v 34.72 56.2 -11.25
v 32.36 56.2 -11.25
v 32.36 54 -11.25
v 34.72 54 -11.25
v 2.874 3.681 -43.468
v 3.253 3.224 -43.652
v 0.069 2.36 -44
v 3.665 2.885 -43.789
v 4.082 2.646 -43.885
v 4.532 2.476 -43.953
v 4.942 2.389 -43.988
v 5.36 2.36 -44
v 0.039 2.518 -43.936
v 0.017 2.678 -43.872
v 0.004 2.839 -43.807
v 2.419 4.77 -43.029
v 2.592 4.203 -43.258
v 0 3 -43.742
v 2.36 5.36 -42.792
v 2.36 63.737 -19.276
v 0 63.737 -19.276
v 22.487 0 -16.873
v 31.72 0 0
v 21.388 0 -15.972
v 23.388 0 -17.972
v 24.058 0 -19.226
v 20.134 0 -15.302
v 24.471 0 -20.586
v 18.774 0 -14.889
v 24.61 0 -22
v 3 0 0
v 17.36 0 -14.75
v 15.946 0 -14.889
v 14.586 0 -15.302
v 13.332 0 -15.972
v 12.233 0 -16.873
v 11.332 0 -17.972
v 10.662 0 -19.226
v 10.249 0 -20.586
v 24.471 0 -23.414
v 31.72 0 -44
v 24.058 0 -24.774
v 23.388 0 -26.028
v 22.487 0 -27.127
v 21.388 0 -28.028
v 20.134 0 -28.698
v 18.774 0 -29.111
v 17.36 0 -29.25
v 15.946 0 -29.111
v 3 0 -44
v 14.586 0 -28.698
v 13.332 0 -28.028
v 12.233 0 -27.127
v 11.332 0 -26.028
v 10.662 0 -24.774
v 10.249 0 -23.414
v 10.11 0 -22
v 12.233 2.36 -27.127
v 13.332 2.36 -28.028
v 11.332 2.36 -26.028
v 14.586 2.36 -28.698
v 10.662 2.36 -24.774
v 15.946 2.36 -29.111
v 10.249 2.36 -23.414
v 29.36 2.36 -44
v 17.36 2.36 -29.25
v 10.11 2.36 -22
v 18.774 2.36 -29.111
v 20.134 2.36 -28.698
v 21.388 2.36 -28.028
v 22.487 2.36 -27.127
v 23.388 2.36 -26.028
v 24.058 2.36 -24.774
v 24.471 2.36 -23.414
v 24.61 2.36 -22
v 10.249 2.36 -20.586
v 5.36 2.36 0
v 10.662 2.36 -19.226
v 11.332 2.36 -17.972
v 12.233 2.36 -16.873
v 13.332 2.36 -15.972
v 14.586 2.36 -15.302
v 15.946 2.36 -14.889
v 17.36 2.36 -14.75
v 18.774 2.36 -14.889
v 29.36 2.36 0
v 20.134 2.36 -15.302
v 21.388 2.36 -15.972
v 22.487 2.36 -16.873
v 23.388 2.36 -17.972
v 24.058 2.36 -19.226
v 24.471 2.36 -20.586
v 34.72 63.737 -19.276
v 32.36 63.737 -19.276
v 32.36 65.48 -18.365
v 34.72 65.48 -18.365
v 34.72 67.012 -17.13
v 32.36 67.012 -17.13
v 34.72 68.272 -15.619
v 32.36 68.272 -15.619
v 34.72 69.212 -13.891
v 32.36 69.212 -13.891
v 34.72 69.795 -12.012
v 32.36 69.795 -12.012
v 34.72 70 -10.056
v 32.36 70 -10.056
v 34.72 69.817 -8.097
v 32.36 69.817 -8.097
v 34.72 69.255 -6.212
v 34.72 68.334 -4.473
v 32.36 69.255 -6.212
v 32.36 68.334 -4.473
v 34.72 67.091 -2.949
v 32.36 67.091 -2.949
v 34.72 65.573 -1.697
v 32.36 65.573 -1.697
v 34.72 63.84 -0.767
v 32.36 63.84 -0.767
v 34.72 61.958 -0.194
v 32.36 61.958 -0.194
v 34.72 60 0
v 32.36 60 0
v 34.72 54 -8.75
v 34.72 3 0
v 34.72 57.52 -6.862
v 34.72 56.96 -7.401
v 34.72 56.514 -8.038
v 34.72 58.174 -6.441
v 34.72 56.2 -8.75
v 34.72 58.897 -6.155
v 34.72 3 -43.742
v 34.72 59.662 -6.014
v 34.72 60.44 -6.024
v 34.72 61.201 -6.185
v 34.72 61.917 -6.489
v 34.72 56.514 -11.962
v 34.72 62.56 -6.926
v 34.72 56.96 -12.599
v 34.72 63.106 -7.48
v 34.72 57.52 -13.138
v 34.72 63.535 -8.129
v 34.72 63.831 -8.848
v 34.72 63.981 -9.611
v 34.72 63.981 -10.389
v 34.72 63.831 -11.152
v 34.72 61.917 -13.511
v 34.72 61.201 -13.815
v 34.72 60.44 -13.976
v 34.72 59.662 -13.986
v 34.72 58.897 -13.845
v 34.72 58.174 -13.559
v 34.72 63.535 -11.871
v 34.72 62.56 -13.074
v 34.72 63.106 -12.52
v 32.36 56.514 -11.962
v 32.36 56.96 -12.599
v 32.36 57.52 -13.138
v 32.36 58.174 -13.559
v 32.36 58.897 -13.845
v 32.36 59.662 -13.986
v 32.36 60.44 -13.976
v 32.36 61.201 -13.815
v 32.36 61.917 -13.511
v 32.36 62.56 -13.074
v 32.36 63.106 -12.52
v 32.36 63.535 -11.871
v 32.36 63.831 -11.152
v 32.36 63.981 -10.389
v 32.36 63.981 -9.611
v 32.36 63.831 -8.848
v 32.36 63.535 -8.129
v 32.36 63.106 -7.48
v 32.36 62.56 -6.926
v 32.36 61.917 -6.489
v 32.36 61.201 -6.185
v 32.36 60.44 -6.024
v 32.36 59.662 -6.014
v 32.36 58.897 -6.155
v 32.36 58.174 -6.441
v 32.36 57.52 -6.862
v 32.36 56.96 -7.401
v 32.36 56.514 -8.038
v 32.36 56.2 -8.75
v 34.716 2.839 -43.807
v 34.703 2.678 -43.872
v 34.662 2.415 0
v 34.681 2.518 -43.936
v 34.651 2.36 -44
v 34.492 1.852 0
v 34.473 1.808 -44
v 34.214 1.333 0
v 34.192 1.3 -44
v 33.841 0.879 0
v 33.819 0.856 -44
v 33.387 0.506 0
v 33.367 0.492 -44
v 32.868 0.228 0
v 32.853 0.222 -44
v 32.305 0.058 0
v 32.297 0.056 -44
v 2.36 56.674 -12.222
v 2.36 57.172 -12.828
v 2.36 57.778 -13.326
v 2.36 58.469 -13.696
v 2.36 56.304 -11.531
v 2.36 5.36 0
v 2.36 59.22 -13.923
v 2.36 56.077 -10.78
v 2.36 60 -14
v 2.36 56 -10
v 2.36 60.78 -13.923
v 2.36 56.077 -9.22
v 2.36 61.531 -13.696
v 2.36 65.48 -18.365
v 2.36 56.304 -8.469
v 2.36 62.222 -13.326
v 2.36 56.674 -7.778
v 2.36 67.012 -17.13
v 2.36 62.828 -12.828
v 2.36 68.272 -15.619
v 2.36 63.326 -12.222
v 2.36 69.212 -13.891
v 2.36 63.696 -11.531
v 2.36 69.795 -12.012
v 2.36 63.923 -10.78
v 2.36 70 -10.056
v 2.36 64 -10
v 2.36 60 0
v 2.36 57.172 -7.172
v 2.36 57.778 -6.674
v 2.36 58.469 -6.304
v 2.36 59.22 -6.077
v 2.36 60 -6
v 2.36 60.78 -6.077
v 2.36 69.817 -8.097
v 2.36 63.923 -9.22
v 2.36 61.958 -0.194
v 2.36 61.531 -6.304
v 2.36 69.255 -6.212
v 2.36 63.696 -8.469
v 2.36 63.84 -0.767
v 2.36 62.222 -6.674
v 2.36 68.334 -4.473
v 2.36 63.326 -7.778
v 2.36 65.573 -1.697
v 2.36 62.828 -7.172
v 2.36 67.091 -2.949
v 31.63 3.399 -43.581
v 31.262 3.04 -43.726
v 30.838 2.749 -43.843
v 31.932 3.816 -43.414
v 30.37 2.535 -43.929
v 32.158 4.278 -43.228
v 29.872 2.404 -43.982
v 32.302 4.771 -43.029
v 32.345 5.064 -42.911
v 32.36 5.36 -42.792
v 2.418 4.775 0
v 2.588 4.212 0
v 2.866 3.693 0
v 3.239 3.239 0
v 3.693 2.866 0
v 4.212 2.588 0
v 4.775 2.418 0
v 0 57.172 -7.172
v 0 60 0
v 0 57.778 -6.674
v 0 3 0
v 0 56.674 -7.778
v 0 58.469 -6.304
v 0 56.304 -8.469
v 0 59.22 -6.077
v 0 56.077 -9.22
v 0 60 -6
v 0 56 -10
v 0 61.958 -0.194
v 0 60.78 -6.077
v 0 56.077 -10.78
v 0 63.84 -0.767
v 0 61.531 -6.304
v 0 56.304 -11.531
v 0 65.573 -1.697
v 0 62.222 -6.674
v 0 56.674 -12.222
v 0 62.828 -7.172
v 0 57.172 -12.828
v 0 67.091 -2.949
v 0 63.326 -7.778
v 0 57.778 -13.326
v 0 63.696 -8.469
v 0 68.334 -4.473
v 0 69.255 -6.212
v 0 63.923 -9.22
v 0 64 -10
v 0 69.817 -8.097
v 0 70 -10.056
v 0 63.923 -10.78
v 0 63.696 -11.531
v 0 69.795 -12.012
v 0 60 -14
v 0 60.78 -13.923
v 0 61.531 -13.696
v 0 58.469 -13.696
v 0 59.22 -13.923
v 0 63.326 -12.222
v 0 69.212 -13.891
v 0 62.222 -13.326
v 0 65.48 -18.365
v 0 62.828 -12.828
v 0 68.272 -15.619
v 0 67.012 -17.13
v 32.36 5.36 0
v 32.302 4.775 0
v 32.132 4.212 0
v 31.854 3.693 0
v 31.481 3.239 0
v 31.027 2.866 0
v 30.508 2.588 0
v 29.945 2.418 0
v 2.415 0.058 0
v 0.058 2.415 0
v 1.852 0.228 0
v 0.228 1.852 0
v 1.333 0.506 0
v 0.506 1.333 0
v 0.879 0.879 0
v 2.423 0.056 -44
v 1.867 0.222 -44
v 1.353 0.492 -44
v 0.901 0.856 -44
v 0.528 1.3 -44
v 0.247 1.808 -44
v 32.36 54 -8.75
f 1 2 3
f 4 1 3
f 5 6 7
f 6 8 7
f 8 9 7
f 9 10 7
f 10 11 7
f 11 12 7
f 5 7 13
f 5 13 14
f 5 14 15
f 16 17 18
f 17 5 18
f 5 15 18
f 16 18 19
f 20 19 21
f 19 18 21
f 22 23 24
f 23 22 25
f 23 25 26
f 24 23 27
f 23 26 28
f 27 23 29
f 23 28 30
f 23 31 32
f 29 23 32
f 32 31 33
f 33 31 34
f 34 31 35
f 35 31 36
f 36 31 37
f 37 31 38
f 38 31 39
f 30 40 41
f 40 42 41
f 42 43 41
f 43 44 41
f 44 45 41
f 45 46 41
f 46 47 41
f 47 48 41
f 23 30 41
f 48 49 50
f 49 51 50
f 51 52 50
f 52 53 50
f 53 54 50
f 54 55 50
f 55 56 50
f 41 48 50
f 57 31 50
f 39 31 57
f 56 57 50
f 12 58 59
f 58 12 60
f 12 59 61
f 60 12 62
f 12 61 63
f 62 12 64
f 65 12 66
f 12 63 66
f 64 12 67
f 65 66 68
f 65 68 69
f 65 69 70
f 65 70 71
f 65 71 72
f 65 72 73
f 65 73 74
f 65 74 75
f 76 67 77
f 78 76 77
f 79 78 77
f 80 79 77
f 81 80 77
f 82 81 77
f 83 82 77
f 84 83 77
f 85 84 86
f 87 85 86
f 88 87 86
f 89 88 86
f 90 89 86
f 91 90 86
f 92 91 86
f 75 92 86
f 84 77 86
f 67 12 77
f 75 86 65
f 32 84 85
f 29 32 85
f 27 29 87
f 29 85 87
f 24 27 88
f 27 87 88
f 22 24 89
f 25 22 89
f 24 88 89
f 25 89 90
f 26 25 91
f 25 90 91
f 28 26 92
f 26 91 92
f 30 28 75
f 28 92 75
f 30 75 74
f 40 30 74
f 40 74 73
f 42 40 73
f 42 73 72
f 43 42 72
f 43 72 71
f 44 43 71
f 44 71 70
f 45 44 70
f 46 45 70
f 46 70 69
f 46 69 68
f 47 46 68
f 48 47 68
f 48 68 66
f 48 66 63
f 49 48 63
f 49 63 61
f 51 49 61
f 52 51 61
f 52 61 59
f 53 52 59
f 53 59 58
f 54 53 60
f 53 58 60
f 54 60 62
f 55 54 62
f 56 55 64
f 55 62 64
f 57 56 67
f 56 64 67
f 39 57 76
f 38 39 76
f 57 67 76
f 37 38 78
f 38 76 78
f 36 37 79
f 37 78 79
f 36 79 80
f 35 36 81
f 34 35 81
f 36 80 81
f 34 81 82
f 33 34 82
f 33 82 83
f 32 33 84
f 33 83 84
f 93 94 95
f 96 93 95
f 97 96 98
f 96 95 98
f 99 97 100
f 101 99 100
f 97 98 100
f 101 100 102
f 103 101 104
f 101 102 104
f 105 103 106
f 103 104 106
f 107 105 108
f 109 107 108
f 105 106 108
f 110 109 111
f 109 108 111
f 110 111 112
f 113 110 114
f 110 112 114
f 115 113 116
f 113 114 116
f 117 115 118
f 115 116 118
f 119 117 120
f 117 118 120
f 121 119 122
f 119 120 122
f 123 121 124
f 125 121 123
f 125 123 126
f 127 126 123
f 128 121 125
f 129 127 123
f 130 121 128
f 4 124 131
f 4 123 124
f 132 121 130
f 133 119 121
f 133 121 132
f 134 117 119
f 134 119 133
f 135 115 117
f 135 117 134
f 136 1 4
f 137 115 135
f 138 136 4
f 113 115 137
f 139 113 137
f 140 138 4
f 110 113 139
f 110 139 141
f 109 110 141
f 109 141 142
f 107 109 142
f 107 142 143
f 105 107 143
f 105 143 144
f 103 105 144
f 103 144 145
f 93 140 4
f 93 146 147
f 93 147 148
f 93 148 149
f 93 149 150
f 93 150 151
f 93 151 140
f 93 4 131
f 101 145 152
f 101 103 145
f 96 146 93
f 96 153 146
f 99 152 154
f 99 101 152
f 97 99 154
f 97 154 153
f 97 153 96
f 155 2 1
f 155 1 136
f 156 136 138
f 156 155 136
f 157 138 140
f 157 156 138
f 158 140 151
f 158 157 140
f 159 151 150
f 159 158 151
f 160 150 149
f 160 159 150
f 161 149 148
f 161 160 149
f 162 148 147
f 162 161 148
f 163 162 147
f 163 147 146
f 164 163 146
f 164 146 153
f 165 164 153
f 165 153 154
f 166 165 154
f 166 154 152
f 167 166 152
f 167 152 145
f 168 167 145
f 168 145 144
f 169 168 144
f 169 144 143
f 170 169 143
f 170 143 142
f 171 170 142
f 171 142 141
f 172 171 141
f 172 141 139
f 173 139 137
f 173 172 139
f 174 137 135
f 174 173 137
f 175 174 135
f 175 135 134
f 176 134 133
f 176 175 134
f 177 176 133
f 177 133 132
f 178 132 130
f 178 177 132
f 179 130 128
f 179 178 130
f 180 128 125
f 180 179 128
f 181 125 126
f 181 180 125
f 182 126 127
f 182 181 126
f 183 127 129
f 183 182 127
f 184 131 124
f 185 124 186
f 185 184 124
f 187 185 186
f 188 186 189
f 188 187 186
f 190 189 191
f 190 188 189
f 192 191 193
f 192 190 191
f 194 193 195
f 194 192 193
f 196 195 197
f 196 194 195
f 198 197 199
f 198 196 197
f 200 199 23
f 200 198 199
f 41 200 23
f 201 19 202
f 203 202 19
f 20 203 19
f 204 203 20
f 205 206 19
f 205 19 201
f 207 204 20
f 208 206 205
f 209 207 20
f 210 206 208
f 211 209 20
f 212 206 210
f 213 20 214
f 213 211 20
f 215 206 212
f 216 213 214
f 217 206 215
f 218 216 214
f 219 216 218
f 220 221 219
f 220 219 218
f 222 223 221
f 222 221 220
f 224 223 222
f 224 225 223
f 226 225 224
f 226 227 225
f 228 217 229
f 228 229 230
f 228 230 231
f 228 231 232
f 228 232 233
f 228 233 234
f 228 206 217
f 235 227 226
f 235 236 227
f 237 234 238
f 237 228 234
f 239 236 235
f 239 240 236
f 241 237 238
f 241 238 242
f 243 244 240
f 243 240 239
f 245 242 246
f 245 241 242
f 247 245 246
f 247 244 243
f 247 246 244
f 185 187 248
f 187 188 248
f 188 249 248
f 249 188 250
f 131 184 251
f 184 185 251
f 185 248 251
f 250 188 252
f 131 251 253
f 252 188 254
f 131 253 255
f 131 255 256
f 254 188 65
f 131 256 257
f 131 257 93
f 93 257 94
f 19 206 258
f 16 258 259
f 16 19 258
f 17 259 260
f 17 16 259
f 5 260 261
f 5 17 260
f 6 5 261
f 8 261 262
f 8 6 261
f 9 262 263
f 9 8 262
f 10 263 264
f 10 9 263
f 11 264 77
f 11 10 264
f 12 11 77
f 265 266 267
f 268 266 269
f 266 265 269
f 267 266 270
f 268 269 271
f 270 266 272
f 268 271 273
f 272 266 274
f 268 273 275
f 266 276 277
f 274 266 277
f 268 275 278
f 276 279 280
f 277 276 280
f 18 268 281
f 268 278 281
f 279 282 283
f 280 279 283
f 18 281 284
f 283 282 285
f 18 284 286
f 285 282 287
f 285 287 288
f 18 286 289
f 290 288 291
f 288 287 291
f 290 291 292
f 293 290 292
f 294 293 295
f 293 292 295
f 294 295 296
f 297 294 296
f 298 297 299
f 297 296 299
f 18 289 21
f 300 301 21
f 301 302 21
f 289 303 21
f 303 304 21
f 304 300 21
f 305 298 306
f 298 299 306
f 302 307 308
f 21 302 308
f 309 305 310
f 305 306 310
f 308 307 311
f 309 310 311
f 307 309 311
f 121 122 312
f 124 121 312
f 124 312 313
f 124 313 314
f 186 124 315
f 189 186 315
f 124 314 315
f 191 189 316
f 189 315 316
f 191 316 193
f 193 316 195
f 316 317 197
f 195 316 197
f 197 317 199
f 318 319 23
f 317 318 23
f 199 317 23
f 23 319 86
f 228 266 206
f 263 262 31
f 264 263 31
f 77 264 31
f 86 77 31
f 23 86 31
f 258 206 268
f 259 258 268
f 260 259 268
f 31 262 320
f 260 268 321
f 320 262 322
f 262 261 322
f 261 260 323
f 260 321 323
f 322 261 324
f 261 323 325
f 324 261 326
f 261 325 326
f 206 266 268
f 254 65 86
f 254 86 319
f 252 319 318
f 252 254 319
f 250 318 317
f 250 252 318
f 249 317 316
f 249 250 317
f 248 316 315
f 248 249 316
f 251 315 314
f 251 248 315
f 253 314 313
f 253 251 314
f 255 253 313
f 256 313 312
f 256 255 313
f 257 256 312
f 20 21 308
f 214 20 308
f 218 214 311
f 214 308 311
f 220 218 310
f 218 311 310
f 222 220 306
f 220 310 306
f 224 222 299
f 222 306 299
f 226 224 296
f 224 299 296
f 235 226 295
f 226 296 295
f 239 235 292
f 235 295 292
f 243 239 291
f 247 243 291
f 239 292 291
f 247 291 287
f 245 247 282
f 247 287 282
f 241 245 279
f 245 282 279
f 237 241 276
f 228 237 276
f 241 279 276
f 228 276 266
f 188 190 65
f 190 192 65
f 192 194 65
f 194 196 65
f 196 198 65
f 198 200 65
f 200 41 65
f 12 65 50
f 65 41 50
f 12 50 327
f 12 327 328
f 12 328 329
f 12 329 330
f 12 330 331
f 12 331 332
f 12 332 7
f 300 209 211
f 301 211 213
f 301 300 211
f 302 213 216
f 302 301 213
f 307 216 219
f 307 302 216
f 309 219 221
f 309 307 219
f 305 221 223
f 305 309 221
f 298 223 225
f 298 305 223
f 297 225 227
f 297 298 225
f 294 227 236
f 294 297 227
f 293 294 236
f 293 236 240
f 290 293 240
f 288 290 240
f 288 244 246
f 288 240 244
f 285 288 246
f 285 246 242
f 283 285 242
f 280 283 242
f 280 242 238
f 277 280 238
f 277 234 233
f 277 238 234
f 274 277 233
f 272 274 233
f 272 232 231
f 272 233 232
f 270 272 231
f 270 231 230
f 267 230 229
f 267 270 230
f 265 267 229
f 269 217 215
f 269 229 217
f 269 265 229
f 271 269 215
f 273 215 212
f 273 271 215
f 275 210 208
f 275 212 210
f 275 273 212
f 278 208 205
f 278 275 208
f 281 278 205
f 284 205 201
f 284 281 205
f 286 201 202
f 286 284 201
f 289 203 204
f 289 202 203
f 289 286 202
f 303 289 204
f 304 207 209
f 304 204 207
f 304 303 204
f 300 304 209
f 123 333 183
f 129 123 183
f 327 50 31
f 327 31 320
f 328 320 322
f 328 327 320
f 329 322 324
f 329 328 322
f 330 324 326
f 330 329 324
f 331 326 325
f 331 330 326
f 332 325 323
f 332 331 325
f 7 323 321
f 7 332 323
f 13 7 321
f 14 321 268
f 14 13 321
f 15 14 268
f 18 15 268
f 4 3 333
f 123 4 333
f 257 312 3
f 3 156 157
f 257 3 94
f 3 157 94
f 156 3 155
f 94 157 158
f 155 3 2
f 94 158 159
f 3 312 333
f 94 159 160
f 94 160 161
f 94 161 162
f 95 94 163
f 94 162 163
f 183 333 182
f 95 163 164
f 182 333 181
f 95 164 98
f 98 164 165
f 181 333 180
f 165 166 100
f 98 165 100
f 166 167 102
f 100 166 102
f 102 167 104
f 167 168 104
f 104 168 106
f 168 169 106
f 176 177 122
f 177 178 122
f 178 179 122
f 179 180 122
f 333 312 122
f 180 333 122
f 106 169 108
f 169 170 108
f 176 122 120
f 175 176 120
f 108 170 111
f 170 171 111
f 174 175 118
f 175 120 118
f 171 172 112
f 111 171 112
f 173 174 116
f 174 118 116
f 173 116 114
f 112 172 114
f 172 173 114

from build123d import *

# Parameters (mm, degrees)
CROQUIS1_R              = 4
SALIENTE_EXTRUIR1_DEPTH = 34.72
CROQUIS2_W              = 30
CROQUIS2_H              = 67.64
CORTAR_EXTRUIR1_DEPTH   = 90.67429063
REDONDEO1_R             = 3
CORTAR_EXTRUIR2_DEPTH   = 89.787215296
CROQUIS4_R              = 7.25
CORTAR_EXTRUIR3_DEPTH   = 88.844453439


with BuildPart() as part:
    # Croquis1 → Saliente-Extruir1 (new body)
    with BuildSketch(Plane(origin=(0, 0, 0), x_dir=(0, 0, -1), z_dir=(1, 0, 0))):
        with BuildLine():
            Line((0, 60), (0, 0))
            Line((0, 0), (44, 0))
            Line((44, 0), (44, 2.36))
            Line((44, 2.36), (19.275687183, 63.736526097))
            ThreePointArc((19.275687183, 63.736526097), (8.096959254, 69.817251953), (0, 60))
        make_face()
        with Locations((10, 60)):
            Circle(CROQUIS1_R, mode=Mode.SUBTRACT)
    extrude(amount=SALIENTE_EXTRUIR1_DEPTH)

    # Croquis2 → Cortar-Extruir1 (cut, through all)
    with BuildSketch(Plane.XY):
        with Locations((17.36, 36.18)):
            Rectangle(CROQUIS2_W, CROQUIS2_H)
    extrude(amount=-CORTAR_EXTRUIR1_DEPTH, mode=Mode.SUBTRACT)

    # Redondeo1
    redondeo1_edges = [part.edges().sort_by_distance(p)[0] for p in [
        (34.72, 0, -22),
        (0, 0, -22),
        (32.36, 2.36, -22),
        (2.36, 2.36, -22),
    ]]
    fillet(redondeo1_edges, radius=REDONDEO1_R)

    # Croquis3 → Cortar-Extruir2 (cut, through all)
    with BuildSketch(Plane.ZY.offset(-32.36)):
        with BuildLine():
            Line((-8.75, 54), (-8.75, 56.200328962))
            ThreePointArc((-8.75, 56.200328962), (-10, 56), (-11.25, 56.200328962))
            Line((-11.25, 56.200328962), (-11.25, 54))
            Line((-11.25, 54), (-8.75, 54))
        make_face()
    extrude(amount=-CORTAR_EXTRUIR2_DEPTH, mode=Mode.SUBTRACT)

    # Croquis4 → Cortar-Extruir3 (cut, through all)
    with BuildSketch(Plane(origin=(0, 2.36, 0), x_dir=(1, 0, 0), z_dir=(0, 1, 0))):
        with Locations(Location((17.36, 22, 0), (0, 0, 270))):
            Circle(CROQUIS4_R)
    extrude(amount=-CORTAR_EXTRUIR3_DEPTH, mode=Mode.SUBTRACT)


solid = part.part
